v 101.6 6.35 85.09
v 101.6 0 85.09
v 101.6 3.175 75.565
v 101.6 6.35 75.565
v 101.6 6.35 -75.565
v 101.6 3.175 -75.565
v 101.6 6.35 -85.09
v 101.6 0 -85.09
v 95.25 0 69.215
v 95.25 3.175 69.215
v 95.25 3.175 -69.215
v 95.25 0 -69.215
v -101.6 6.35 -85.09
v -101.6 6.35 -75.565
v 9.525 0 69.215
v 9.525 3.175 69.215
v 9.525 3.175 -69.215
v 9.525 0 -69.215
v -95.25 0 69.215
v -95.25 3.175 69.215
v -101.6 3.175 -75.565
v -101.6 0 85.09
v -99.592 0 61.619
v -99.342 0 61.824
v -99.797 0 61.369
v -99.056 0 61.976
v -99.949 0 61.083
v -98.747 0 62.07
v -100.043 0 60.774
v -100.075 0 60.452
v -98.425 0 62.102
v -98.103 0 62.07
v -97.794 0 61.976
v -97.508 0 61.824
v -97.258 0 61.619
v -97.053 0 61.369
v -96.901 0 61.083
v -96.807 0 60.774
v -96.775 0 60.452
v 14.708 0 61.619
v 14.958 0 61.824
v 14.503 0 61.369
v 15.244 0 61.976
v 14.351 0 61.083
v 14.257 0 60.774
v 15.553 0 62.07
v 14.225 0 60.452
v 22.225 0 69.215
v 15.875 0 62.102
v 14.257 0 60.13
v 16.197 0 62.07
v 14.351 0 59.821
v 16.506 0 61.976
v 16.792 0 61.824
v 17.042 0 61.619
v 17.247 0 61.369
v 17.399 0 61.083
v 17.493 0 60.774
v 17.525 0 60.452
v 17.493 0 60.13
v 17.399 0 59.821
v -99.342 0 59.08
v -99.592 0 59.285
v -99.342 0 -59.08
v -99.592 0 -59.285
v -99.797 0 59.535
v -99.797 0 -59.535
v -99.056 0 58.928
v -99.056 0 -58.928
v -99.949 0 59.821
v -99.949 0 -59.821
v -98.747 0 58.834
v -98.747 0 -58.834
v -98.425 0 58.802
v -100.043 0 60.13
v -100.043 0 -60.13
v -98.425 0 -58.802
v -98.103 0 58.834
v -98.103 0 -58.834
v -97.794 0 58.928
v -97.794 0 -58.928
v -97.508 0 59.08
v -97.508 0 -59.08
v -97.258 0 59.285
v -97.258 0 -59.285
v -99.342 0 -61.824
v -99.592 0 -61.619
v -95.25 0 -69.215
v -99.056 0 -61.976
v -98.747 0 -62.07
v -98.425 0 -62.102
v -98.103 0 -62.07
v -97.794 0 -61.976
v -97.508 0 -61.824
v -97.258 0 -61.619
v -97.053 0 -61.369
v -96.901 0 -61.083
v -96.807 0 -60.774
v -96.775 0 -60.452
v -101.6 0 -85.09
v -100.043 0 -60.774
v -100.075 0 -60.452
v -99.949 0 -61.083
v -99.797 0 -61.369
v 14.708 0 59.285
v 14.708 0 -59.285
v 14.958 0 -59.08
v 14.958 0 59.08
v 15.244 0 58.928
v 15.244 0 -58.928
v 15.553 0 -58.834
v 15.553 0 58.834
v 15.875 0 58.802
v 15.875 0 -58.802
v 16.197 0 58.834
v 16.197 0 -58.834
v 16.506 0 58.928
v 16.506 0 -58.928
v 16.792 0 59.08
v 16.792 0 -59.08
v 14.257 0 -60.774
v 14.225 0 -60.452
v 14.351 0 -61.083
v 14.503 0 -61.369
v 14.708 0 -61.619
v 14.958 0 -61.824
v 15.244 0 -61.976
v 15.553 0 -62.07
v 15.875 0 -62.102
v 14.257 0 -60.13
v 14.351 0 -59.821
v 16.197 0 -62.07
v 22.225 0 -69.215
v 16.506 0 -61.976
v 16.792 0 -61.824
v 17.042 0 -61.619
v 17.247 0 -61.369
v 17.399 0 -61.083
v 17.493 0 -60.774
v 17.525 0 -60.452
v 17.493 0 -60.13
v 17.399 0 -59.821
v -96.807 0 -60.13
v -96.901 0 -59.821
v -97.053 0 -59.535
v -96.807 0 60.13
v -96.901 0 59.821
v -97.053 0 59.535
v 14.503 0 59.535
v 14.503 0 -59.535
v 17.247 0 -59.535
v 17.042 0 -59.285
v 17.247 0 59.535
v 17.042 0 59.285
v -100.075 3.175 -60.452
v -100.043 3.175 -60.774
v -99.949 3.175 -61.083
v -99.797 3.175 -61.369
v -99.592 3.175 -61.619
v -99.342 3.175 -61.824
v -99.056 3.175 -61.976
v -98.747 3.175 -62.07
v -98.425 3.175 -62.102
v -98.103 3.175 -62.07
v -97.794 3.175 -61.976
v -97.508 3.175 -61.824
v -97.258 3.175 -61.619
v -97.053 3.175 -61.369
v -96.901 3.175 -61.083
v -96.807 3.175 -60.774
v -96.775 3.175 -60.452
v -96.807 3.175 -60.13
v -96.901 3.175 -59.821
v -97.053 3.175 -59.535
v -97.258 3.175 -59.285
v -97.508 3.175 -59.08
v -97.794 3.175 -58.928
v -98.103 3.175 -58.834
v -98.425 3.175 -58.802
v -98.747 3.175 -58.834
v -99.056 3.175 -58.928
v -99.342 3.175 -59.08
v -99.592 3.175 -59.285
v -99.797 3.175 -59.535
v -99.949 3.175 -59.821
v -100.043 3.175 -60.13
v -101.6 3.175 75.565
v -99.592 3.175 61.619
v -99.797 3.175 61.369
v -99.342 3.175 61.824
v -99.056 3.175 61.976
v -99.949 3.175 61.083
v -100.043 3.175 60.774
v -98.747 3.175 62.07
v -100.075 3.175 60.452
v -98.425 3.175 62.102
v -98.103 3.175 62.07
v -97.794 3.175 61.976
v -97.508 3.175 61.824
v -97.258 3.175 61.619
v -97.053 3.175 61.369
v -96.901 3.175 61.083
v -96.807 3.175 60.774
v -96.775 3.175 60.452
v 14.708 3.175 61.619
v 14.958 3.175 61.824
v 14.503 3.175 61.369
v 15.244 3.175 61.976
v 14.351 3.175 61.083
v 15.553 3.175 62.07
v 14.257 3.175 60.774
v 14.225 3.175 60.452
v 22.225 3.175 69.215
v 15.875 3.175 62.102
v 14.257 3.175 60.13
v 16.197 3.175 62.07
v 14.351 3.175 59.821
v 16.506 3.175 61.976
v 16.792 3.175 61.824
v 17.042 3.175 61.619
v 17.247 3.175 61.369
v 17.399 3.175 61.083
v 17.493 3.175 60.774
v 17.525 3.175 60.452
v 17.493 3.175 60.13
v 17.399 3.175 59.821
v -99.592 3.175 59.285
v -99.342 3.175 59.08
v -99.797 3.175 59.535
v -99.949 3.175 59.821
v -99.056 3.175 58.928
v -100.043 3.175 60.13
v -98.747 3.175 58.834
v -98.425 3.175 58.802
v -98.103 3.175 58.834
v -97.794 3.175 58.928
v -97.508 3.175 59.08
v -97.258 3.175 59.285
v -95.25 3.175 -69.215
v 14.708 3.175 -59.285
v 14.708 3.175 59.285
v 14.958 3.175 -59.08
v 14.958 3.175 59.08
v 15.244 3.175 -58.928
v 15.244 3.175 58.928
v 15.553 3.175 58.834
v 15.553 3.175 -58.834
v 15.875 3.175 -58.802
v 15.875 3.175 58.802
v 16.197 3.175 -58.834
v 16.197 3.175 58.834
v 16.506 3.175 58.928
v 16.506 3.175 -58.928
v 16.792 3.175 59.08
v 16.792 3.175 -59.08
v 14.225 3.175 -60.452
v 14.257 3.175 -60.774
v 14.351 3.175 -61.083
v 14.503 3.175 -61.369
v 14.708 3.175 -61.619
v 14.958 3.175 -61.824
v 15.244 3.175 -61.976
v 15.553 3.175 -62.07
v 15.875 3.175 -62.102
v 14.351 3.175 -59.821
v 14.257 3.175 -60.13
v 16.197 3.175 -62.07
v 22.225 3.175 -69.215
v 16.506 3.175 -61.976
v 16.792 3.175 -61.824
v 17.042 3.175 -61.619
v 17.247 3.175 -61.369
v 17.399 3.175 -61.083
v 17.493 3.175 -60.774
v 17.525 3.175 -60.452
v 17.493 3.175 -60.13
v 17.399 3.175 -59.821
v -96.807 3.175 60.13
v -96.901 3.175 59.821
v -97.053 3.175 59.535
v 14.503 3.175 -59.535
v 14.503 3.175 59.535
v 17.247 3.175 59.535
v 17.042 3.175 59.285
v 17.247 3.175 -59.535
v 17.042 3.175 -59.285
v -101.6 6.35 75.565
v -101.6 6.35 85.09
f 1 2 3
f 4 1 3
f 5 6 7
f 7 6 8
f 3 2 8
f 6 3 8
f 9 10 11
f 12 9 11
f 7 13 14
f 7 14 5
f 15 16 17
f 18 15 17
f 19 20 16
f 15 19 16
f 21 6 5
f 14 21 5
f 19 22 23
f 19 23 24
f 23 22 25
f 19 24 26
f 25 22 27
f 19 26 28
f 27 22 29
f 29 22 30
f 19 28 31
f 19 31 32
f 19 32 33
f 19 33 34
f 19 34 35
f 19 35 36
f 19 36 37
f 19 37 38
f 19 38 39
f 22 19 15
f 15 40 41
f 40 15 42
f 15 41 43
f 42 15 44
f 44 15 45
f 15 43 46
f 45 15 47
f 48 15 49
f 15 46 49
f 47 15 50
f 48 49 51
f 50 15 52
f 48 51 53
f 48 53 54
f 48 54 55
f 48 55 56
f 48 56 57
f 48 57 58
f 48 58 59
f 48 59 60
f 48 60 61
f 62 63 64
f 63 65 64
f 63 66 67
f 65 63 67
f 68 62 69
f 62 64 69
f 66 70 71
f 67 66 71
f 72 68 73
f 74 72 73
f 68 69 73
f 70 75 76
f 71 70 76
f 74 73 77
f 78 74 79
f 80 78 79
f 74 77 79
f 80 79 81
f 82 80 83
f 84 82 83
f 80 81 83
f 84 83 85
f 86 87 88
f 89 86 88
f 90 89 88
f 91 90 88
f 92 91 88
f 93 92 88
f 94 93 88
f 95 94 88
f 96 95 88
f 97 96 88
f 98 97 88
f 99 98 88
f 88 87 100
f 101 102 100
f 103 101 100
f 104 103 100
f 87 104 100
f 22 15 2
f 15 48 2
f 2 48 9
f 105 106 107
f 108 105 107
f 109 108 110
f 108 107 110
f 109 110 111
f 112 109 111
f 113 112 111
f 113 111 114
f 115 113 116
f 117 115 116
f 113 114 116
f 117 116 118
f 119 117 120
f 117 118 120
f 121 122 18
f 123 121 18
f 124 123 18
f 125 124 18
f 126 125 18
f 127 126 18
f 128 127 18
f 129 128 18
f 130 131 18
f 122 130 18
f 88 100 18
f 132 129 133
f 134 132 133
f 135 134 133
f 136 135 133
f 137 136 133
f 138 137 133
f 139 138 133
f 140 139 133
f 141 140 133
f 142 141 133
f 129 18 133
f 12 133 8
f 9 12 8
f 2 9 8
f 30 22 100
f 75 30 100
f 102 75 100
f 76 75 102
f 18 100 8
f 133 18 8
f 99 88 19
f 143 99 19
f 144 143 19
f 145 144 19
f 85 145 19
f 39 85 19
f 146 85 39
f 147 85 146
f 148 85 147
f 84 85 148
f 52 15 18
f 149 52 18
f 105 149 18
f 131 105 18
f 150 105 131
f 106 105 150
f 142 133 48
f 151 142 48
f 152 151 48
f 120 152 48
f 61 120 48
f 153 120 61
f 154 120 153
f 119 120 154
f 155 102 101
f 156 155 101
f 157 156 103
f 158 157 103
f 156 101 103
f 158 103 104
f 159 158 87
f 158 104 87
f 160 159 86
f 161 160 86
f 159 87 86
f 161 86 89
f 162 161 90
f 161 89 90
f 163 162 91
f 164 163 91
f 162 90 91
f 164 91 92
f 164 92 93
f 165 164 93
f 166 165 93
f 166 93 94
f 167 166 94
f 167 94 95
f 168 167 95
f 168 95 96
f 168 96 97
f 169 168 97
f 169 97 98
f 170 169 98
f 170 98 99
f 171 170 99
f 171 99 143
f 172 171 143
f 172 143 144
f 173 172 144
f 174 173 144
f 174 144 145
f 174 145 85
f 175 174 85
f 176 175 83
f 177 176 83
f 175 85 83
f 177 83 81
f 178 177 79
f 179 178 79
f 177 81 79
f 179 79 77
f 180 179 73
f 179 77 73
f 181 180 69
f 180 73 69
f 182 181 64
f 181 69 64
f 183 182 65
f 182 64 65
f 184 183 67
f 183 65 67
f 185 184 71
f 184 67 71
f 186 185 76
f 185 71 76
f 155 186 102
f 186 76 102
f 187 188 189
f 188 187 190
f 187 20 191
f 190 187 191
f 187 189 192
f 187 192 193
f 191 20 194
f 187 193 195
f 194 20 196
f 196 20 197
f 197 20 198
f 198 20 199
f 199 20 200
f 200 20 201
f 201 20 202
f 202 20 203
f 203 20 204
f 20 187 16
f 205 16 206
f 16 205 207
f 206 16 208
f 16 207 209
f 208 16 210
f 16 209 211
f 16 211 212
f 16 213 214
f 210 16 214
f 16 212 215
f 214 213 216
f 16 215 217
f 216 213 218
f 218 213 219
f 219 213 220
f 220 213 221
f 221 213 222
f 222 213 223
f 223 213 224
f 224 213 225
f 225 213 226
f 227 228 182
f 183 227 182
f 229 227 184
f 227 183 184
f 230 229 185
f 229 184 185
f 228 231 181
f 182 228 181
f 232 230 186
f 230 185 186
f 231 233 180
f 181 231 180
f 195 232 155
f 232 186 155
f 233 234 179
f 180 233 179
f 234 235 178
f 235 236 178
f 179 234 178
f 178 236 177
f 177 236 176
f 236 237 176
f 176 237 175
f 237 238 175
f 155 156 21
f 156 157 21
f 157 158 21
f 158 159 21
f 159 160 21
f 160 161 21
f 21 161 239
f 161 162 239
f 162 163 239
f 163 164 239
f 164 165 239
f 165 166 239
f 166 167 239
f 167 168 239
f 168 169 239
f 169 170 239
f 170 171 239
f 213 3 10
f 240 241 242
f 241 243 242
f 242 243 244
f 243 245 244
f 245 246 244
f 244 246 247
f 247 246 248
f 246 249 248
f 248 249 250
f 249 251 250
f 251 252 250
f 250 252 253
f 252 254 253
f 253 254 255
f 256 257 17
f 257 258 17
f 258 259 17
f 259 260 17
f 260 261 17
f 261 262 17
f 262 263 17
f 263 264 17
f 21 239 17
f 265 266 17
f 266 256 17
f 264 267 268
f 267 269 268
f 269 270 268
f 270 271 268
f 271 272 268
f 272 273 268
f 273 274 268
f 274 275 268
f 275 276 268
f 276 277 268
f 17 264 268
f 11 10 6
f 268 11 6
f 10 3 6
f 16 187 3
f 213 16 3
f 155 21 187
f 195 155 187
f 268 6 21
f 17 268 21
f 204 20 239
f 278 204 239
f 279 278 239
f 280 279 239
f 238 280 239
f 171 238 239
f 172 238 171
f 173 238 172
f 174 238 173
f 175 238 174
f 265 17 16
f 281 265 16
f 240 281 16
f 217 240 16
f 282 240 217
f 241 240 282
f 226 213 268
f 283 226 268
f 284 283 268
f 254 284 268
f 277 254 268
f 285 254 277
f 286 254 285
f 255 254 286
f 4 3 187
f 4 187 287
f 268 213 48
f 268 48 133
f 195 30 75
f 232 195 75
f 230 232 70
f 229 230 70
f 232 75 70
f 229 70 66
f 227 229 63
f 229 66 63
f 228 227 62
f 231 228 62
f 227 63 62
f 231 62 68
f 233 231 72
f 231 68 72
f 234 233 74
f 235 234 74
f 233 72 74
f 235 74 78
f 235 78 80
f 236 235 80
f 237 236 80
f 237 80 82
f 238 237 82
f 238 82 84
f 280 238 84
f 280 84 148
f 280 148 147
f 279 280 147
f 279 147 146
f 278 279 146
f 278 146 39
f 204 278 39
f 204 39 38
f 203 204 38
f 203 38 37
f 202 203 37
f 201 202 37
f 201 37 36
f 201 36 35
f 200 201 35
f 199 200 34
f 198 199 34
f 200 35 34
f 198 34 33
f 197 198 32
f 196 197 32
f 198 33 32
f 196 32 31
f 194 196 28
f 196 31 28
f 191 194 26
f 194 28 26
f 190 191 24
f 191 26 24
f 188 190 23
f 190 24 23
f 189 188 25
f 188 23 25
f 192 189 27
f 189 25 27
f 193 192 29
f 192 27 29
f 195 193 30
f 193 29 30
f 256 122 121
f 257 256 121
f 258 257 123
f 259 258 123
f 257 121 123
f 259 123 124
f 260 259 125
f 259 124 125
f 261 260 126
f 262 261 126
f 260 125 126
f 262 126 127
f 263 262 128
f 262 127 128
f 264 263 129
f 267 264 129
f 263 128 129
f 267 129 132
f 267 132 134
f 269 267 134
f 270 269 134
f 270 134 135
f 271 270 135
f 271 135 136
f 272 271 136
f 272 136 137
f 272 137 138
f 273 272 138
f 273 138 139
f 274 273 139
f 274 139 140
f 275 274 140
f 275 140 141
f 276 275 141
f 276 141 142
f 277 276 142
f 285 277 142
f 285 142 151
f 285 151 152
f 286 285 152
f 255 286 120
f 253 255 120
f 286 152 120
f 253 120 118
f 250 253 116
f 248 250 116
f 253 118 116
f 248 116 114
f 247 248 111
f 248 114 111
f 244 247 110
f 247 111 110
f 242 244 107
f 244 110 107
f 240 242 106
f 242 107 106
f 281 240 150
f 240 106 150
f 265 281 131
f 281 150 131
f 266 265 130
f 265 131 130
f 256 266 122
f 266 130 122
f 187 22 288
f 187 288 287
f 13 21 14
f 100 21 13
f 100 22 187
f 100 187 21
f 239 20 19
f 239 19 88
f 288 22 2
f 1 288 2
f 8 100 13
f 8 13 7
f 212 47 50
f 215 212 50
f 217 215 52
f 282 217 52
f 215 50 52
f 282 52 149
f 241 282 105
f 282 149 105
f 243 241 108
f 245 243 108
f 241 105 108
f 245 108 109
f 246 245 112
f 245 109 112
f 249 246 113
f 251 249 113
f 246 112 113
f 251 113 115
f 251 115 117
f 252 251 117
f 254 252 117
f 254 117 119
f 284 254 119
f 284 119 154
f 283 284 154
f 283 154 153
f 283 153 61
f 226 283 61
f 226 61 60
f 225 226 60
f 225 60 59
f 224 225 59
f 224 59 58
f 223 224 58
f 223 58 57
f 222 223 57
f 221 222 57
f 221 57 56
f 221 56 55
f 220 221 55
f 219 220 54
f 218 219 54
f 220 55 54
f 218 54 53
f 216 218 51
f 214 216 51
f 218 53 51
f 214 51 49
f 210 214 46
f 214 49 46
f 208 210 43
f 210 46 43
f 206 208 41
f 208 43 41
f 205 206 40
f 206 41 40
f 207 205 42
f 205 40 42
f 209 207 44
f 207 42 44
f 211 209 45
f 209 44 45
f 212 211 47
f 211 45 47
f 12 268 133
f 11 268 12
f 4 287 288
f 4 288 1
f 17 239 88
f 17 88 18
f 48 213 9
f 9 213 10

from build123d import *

# Parameters (mm, degrees)
SKETCH1_W                 = 203.2
SKETCH1_H                 = 170.18
BOSS_EXTRUDE1_DEPTH       = 6.35
SKETCH3_W                 = 151.13
SKETCH3_H                 = 3.175
CUT_EXTRUDE1_DEPTH        = 204.2
SKETCH4_W                 = 104.775
SKETCH4_H                 = 138.43
SKETCH4_W_2               = 73.025
CUT_EXTRUDE3_DEPTH        = 4.175
M4X0_7_TAPPED_HOLE1_D     = 3.3
M4X0_7_TAPPED_HOLE1_DEPTH = 9.906


with BuildPart() as part:
    # Sketch1 → Boss-Extrude1 (new body)
    with BuildSketch(Plane(origin=(0, 0, 0), x_dir=(1, 0, 0), z_dir=(0, 1, 0))):
        Rectangle(SKETCH1_W, SKETCH1_H)
    extrude(amount=BOSS_EXTRUDE1_DEPTH)

    # Sketch3 → Cut-Extrude1 (cut, through all)
    with BuildSketch(Plane(origin=(101.6, 0, 0), x_dir=(0, 0, -1), z_dir=(1, 0, 0))):
        with Locations((0, 4.7625)):
            Rectangle(SKETCH3_W, SKETCH3_H)
    extrude(amount=-CUT_EXTRUDE1_DEPTH, mode=Mode.SUBTRACT)

    # Sketch4 → Cut-Extrude3 (cut, through all)
    with BuildSketch(Plane(origin=(0, 3.175, 0), x_dir=(1, 0, 0), z_dir=(0, 1, 0))):
        with Locations((-42.8625, 0)):
            Rectangle(SKETCH4_W, SKETCH4_H)
        with Locations((58.7375, 0)):
            Rectangle(SKETCH4_W_2, SKETCH4_H)
    extrude(amount=-CUT_EXTRUDE3_DEPTH, mode=Mode.SUBTRACT)

    # M4x0.7 Tapped Hole1
    with Locations(Plane(origin=(0, 3.175, 0), x_dir=(1, 0, 0), z_dir=(0, 1, 0))):
        with Locations((-98.425, -60.452), (-98.425, 60.452), (15.875, 60.452), (15.875, -60.452)):
            Hole(M4X0_7_TAPPED_HOLE1_D / 2, depth=M4X0_7_TAPPED_HOLE1_DEPTH)


solid = part.part
